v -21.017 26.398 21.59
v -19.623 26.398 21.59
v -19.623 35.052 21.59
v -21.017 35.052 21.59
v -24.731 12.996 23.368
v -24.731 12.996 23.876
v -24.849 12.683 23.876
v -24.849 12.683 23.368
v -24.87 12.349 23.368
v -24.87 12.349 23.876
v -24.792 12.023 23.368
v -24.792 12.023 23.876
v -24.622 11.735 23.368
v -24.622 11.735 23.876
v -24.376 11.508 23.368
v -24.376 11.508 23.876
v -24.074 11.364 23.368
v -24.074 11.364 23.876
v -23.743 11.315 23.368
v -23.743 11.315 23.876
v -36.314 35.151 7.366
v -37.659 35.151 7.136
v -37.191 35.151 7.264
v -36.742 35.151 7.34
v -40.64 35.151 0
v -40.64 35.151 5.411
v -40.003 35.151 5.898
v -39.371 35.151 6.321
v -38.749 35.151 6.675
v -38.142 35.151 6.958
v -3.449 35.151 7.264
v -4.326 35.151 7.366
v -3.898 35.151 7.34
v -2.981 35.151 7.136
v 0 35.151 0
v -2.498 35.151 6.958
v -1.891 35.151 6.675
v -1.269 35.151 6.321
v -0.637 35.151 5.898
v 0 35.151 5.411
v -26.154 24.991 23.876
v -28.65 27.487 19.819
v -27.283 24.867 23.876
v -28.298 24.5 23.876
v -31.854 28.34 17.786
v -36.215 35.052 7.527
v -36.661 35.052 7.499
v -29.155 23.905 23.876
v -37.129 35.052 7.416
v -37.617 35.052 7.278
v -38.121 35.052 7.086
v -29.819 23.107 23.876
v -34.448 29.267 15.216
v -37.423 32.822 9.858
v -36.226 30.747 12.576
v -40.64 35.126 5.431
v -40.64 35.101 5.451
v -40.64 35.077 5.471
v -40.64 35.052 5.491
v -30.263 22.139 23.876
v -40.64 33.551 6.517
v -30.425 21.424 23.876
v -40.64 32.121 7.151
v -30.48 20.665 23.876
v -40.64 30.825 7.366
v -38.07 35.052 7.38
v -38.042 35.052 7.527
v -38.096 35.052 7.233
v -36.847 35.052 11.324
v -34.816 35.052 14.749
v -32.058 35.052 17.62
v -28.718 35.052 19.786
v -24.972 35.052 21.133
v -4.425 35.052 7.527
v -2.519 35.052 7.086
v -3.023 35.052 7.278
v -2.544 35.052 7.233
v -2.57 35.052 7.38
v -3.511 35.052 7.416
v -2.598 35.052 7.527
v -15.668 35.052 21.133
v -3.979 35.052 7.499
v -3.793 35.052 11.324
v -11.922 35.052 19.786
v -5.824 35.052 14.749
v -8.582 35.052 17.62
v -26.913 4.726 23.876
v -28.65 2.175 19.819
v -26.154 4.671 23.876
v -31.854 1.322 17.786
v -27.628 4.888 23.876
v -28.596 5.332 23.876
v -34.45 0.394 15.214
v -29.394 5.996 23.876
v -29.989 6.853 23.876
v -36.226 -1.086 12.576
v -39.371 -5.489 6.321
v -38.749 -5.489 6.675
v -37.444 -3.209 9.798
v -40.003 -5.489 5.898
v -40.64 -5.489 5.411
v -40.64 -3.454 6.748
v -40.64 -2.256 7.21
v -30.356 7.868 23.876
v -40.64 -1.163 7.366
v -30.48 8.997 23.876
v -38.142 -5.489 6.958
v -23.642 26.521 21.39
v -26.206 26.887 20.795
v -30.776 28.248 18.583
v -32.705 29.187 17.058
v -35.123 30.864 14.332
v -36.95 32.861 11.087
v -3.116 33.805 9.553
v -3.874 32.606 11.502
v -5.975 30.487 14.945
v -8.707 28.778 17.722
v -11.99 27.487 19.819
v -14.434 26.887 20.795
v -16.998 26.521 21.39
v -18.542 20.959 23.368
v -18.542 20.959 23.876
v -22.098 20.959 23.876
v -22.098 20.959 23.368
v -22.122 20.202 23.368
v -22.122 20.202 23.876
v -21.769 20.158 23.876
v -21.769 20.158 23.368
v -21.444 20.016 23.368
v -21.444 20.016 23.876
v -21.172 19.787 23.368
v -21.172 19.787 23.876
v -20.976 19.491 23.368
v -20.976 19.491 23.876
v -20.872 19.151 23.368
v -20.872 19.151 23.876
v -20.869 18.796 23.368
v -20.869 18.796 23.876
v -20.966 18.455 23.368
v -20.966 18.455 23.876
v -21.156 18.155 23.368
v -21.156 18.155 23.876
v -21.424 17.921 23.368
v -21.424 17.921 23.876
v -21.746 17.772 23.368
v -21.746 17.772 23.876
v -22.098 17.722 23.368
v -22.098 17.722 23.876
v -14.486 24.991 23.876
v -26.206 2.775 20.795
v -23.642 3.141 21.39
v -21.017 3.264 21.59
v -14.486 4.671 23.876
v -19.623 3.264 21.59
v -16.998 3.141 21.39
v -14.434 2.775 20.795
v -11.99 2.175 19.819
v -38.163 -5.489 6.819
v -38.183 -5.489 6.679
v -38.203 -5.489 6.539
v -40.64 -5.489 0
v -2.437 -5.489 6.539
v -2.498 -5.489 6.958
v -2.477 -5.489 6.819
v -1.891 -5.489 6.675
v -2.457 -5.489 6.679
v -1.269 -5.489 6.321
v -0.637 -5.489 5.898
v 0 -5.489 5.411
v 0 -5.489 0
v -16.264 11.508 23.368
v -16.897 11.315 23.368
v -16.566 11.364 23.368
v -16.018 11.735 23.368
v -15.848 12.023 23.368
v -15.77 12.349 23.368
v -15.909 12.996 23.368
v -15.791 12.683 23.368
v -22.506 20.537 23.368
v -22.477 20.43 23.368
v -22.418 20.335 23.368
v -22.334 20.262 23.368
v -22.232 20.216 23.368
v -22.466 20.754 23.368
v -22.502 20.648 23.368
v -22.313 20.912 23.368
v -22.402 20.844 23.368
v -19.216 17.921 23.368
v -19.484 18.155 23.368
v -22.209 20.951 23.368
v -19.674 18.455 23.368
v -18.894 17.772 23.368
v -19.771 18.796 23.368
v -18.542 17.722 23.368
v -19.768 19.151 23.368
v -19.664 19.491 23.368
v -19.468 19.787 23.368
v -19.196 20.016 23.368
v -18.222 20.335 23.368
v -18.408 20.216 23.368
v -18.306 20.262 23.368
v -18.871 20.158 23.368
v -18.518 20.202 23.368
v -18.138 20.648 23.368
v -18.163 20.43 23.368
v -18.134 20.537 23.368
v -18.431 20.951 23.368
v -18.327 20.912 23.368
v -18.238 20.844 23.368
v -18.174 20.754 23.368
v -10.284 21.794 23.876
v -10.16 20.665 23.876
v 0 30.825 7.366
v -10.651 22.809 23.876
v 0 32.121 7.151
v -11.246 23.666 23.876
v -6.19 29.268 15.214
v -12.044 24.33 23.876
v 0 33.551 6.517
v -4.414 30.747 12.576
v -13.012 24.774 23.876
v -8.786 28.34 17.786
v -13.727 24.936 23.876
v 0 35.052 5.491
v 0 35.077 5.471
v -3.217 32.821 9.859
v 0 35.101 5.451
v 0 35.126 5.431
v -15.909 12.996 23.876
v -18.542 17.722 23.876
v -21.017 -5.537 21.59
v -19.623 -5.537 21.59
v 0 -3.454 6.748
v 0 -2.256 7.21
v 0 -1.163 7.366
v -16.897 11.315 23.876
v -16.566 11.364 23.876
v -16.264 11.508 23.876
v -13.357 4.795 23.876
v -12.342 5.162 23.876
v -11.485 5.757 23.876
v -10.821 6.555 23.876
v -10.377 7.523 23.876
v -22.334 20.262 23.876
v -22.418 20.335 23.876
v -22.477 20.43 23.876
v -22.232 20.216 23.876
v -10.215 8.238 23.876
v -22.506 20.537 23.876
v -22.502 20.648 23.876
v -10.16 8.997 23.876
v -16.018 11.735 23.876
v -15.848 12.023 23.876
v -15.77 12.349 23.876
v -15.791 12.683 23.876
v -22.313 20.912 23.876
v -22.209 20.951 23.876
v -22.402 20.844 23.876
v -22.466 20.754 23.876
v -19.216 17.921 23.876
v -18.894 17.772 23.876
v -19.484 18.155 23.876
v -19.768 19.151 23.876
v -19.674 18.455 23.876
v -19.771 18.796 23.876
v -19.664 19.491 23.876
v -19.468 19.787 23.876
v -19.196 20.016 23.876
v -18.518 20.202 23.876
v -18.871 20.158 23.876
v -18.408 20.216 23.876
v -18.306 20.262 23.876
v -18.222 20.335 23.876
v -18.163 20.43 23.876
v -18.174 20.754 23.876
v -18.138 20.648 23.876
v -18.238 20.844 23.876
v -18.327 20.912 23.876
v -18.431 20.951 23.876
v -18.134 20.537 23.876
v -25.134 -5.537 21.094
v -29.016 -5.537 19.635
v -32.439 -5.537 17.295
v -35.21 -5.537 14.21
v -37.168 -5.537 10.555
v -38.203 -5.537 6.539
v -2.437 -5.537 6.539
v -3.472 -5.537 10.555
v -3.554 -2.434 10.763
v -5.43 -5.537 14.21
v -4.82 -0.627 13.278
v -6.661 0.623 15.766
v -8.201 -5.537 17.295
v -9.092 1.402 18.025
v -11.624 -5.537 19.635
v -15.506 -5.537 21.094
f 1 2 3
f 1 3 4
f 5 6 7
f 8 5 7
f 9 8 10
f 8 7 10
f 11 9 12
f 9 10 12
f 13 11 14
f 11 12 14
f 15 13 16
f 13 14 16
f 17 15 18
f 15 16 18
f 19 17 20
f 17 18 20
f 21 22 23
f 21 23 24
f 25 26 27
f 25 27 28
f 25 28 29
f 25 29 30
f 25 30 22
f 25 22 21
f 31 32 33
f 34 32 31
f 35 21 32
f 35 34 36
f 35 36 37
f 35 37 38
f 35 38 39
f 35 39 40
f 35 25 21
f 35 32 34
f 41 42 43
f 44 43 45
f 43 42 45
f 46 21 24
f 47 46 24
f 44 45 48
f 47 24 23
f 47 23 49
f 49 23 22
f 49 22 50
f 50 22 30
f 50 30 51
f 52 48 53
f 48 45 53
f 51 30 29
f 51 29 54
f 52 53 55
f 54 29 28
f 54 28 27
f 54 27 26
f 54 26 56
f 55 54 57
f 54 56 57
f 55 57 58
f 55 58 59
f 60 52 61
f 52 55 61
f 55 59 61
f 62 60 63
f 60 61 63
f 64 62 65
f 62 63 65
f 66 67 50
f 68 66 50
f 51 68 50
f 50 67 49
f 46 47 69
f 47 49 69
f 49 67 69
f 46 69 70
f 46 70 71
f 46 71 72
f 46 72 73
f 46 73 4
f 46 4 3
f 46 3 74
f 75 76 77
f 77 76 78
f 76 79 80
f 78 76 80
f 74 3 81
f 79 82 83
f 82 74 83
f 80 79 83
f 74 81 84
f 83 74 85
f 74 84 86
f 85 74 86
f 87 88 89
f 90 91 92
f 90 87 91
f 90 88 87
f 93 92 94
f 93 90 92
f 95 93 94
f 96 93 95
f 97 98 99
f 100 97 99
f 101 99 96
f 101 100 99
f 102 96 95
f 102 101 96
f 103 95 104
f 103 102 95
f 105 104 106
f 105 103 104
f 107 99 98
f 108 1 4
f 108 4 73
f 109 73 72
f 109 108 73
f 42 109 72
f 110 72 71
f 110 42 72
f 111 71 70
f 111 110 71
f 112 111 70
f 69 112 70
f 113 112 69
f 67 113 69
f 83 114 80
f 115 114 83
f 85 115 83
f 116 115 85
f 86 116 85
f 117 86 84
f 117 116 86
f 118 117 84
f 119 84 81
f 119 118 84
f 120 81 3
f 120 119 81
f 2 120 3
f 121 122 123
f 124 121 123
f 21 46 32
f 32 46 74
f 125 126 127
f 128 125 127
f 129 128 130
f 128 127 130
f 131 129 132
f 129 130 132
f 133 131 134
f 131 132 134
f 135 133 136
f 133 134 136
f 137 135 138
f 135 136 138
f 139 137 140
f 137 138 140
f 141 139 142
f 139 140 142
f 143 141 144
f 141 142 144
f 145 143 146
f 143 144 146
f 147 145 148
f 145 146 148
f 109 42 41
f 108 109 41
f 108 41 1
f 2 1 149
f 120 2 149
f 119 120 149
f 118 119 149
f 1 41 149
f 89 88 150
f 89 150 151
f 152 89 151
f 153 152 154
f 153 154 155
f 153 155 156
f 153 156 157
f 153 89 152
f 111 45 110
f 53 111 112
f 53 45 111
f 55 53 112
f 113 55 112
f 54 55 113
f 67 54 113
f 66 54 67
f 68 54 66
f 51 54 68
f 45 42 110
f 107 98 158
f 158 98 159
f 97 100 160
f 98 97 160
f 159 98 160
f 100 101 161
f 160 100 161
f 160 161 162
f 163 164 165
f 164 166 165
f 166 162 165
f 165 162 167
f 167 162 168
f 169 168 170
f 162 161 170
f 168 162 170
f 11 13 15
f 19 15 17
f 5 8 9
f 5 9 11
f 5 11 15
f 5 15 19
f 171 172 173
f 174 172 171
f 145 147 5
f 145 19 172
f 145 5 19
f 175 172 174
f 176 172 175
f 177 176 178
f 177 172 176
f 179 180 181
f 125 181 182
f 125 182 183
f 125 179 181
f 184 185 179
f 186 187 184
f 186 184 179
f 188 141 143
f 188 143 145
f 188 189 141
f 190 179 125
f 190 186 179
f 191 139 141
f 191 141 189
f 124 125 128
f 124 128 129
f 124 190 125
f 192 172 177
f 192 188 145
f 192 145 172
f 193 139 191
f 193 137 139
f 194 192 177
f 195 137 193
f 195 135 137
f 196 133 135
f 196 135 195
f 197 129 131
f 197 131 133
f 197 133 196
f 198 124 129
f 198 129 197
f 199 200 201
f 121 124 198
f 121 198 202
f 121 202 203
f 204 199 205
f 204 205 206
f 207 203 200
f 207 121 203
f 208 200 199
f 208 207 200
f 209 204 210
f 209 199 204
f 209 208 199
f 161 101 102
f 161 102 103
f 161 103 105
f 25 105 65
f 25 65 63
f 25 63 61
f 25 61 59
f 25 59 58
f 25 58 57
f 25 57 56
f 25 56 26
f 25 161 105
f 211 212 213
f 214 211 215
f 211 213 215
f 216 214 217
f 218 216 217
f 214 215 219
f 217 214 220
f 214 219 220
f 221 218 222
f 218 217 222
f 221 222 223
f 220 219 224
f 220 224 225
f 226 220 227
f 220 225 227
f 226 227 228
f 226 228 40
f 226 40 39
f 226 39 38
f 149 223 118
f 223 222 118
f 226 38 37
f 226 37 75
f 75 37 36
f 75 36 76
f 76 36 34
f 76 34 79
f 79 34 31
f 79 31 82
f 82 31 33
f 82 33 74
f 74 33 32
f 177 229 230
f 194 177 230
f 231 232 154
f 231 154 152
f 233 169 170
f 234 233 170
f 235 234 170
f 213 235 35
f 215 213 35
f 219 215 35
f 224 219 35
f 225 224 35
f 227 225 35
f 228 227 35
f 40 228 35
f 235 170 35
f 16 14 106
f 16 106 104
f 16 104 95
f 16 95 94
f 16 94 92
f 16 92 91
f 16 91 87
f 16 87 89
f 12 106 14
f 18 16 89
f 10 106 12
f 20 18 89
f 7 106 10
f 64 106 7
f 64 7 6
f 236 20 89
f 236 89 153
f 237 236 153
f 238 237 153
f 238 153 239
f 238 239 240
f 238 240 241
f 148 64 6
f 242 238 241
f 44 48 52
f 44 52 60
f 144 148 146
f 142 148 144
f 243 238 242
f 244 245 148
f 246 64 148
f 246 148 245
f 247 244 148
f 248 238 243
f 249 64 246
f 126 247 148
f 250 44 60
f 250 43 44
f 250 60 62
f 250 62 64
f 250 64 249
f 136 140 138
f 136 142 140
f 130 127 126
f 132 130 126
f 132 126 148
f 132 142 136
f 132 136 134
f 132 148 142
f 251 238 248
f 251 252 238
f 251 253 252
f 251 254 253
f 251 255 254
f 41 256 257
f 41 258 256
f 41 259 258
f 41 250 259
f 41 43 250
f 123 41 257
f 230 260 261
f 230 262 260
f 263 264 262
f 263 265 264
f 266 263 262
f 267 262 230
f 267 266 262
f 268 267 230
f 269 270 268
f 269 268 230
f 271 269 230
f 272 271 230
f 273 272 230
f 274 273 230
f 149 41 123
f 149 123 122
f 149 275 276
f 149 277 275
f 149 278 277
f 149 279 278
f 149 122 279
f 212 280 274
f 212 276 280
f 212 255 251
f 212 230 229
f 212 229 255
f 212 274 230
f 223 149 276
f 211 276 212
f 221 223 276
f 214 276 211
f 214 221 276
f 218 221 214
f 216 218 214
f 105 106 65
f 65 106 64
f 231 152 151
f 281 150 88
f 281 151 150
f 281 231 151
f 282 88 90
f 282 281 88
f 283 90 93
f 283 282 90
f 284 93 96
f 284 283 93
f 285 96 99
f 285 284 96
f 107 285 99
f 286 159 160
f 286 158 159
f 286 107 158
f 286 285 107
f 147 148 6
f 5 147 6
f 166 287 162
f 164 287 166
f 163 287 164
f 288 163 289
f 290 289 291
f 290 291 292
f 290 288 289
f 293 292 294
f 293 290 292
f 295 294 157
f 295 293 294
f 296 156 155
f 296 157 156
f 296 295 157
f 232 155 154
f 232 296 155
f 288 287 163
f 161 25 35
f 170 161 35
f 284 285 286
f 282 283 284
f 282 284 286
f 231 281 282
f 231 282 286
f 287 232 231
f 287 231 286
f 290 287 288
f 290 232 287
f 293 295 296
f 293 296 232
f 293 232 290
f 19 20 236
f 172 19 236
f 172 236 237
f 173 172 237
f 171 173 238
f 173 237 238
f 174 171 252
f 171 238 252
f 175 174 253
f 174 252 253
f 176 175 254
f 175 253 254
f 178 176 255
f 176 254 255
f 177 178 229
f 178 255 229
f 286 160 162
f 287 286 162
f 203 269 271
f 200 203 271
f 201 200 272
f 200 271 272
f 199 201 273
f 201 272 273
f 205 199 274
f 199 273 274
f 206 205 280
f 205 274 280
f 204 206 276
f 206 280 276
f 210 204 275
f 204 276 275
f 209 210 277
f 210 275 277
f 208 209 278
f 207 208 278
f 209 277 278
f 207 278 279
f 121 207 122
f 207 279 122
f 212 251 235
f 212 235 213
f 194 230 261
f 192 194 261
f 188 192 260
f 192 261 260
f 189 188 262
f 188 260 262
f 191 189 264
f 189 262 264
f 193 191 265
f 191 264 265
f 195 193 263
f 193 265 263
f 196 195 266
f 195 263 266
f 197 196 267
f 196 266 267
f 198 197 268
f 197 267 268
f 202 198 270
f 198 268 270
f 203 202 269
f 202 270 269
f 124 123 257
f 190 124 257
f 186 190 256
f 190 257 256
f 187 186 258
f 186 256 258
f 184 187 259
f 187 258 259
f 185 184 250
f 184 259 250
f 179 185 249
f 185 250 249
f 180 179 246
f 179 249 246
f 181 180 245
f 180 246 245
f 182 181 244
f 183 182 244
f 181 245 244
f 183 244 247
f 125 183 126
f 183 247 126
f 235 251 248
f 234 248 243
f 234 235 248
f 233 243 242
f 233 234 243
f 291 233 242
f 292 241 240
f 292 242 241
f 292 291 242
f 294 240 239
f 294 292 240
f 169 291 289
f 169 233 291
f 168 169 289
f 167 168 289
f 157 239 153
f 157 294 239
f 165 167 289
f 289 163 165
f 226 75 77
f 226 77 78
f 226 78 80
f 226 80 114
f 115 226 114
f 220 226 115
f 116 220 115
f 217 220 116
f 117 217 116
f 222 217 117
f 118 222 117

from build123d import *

# Parameters (mm, degrees)
F0_W          = 40.64
F0_H          = 40.64
F1_DEPTH      = 23.876
F2_SIZE2      = 10.16
F2_SIZE       = 16.51
F4_DEPTH      = 5.5372
F4_DEPTH_BACK = 35.052
F6_DEPTH      = 0.508
F7_T4_DEPTH   = 41.0469310155
F7_S5_R       = 17.3367265746
F7_T6_DEPTH   = 25
F7_T10_DEPTH  = 41.0469310155
F7_S11_R      = 17.3367265746
F7_T12_DEPTH  = 25
F7_T16_DEPTH  = 41.0469310155
F7_S17_R      = 17.3367265746
F7_T18_DEPTH  = 25
F7_T23_DEPTH  = 41.0469310155
F7_S24_R      = 17.3367265746
F7_T25_DEPTH  = 25
F7_T30_DEPTH  = 41.0469310155
F7_S31_R      = 17.3367265746
F7_T32_DEPTH  = 25
F7_T37_DEPTH  = 41.0469310155
F7_S39_R      = 17.3367265746
F7_T40_DEPTH  = 25
F7_T44_DEPTH  = 41.0469310155
F7_S46_R      = 17.3367265746
F7_T47_DEPTH  = 25
F7_T51_DEPTH  = 41.0469310155
F7_S53_R      = 17.3367265746
F7_T54_DEPTH  = 25


# Not quite as in the source:
# - a fillet or chamfer that OpenCascade refuses, or shapes differently, is made with other operations: its cross-section is extruded or revolved along the edge and cut away or added


with BuildPart() as f1:
    # F0 (on Top) → F1 (new body)
    with BuildSketch(Plane.XY):
        with Locations((-20.32, 14.8309261845)):
            Rectangle(F0_W, F0_H)
    extrude(amount=F1_DEPTH)

    # F2
    f2_edges = [f1.edges().sort_by_distance(p)[0] for p in [
        (0, 14.830926, 23.876),
        (-20.32, 35.150926, 23.876),
        (-40.64, 14.830926, 23.876),
        (-20.32, -5.489074, 23.876),
    ]]
    chamfer(f2_edges, length=F2_SIZE, length2=F2_SIZE2)

    # F3 (on Front) → F4 (join, two sides)
    with BuildSketch(Plane.XZ) as f4_sk:
        with BuildLine():
            Line((-19.622727835, 21.5899987397), (-21.017272165, 21.5899987397))
            ThreePointArc((-21.017272165, 21.5899987397), (-32.4394065874, 17.2953936781), (-38.2026230943, 6.5392734254))
            Line((-38.2026230943, 6.5392734254), (-2.4373769057, 6.5392734254))
            ThreePointArc((-2.4373769057, 6.5392734254), (-8.2005934126, 17.2953936781), (-19.622727835, 21.5899987397))
        make_face()
    extrude(amount=F4_DEPTH)
    extrude(f4_sk.sketch, amount=-F4_DEPTH_BACK)

    # F5 (on face) → F6 (cut)
    with BuildSketch(Plane.XY.offset(23.876)):
        with BuildLine():
            Line((-20.32, 11.3146617191), (-20.32, 20.958676386))
            Line((-20.32, 20.958676386), (-22.098, 20.958676386))
            ThreePointArc((-22.098, 20.958676386), (-22.5080143202, 20.5929218839), (-22.1218966733, 20.2020238648))
            ThreePointArc((-22.1218966733, 20.2020238648), (-20.8577108363, 18.9738562556), (-22.098, 17.7215606446))
            Line((-22.098, 17.7215606446), (-24.7307707736, 12.9957624854))
            ThreePointArc((-24.7307707736, 12.9957624854), (-24.7178678661, 11.8725673854), (-23.7429447999, 11.3146617191))
            Line((-23.7429447999, 11.3146617191), (-20.32, 11.3146617191))
        make_face()
        with BuildLine():
            Line((-18.542, 20.958676386), (-20.32, 20.958676386))
            Line((-20.32, 20.958676386), (-20.32, 11.3146617191))
            Line((-20.32, 11.3146617191), (-16.8970552001, 11.3146617191))
            ThreePointArc((-16.8970552001, 11.3146617191), (-15.9221321339, 11.8725673854), (-15.9092292264, 12.9957624854))
            Line((-15.9092292264, 12.9957624854), (-18.542, 17.7215606446))
            ThreePointArc((-18.542, 17.7215606446), (-19.7822891637, 18.9738562556), (-18.5181033267, 20.2020238648))
            ThreePointArc((-18.5181033267, 20.2020238648), (-18.1319856798, 20.5929218839), (-18.542, 20.958676386))
        make_face()
    extrude(amount=-F6_DEPTH, mode=Mode.SUBTRACT)

    # F7: fillet of radius 5.08 on 4 edges, made by hand


with BuildPart() as f7_tool2:
    # F7_s3 → F7_t4 (new body)
    with BuildSketch(Plane(origin=(-11.8080697784, -11.8080697784, -19.18811339), x_dir=(-0.7071067812, 0.7071067812, 0), z_dir=(0.4642070825, 0.4642070825, 0.7543365091))):
        with BuildLine():
            ThreePointArc((21.7962143454, 27.1330755892), (24.85545827, 28.157532887), (27.9147021947, 27.1330755892))
            Line((27.9147021947, 27.1330755892), (24.85545827, 29.4407749719))
            Line((24.85545827, 29.4407749719), (21.7962143454, 27.1330755892))
        make_face()
    extrude(amount=F7_T4_DEPTH)

    # F7_s5 → F7_t6 (cut, symmetric)
    with BuildSketch(Plane.XZ.offset(-0.8)):
        with Locations((-21.017272165, 4.253272165)):
            Circle(F7_S5_R)
    extrude(amount=F7_T6_DEPTH, both=True, mode=Mode.SUBTRACT)


with BuildPart() as f1_1:
    add(f1.part)

    # F7_t1: cut F7_tool2
    add(f7_tool2.part, mode=Mode.SUBTRACT)


with BuildPart() as f7_tool8:
    # F7_s9 → F7_t10 (new body)
    with BuildSketch(Plane(origin=(3.050628701, -3.050628701, -4.9572716391), x_dir=(-0.7071067812, -0.7071067812, 0), z_dir=(-0.4642070825, 0.4642070825, 0.7543365091))):
        with BuildLine():
            ThreePointArc((0.8221173927, 5.4558434178), (3.8813613174, 6.4803007156), (6.9406052421, 5.4558434178))
            Line((6.9406052421, 5.4558434178), (3.8813613174, 7.7635428005))
            Line((3.8813613174, 7.7635428005), (0.8221173927, 5.4558434178))
        make_face()
    extrude(amount=F7_T10_DEPTH)

    # F7_s11 → F7_t12 (cut, symmetric)
    with BuildSketch(Plane.XZ.offset(-0.8)):
        with Locations((-19.622727835, 4.253272165)):
            Circle(F7_S11_R)
    extrude(amount=F7_T12_DEPTH, both=True, mode=Mode.SUBTRACT)


with BuildPart() as f1_2:
    add(f1_1.part)

    # F7_t7: cut F7_tool8
    add(f7_tool8.part, mode=Mode.SUBTRACT)


with BuildPart() as f7_tool14:
    # F7_s15 → F7_t16 (new body)
    with BuildSketch(Plane(origin=(9.442408336, 9.442408336, -15.3439135461), x_dir=(0.7071067812, -0.7071067812, 0), z_dir=(-0.4642070825, -0.4642070825, 0.7543365091))):
        with BuildLine():
            ThreePointArc((-21.7962143454, 21.2773704954), (-24.85545827, 22.3018277932), (-27.9147021947, 21.2773704954))
            Line((-27.9147021947, 21.2773704954), (-24.85545827, 23.5850698781))
            Line((-24.85545827, 23.5850698781), (-21.7962143454, 21.2773704954))
        make_face()
    extrude(amount=F7_T16_DEPTH)

    # F7_s17 → F7_t18 (cut, symmetric)
    with BuildSketch(Plane.XZ.offset(-28.8)):
        with Locations((-19.622727835, 4.253272165)):
            Circle(F7_S17_R)
    extrude(amount=F7_T18_DEPTH, both=True, mode=Mode.SUBTRACT)

    split(bisect_by=Plane.XZ.offset(-35.052), keep=Keep.BOTTOM)


with BuildPart() as f1_3:
    add(f1_2.part)

    # F7_t13: cut F7_tool14
    add(f7_tool14.part, mode=Mode.SUBTRACT)


with BuildPart() as f7_tool21:
    # F7_s22 → F7_t23 (new body)
    with BuildSketch(Plane(origin=(9.442408336, 9.442408336, -15.3439135461), x_dir=(0.7071067812, -0.7071067812, 0), z_dir=(-0.4642070825, -0.4642070825, 0.7543365091))):
        with BuildLine():
            ThreePointArc((-21.7962143454, 21.2773704954), (-24.85545827, 22.3018277932), (-27.9147021947, 21.2773704954))
            Line((-27.9147021947, 21.2773704954), (-24.85545827, 23.5850698781))
            Line((-24.85545827, 23.5850698781), (-21.7962143454, 21.2773704954))
        make_face()
    extrude(amount=F7_T23_DEPTH)

    # F7_s24 → F7_t25 (intersect, symmetric)
    with BuildSketch(Plane.XZ.offset(-28.8)):
        with Locations((-19.622727835, 4.253272165)):
            Circle(F7_S24_R)
    extrude(amount=F7_T25_DEPTH, both=True, mode=Mode.INTERSECT)

    split(bisect_by=Plane.XZ.offset(-35.052), keep=Keep.BOTTOM)


with BuildPart() as f1_4:
    add(f1_3.part)

    # F7_t20: cut F7_tool21
    add(f7_tool21.part, mode=Mode.SUBTRACT)


with BuildPart() as f7_tool28:
    # F7_s29 → F7_t30 (new body)
    with BuildSketch(Plane(origin=(9.442408336, 9.442408336, -15.3439135461), x_dir=(0.7071067812, -0.7071067812, 0), z_dir=(-0.4642070825, -0.4642070825, 0.7543365091))):
        with BuildLine():
            ThreePointArc((-21.7962143454, 21.2773704954), (-24.85545827, 22.3018277932), (-27.9147021947, 21.2773704954))
            Line((-27.9147021947, 21.2773704954), (-24.85545827, 23.5850698781))
            Line((-24.85545827, 23.5850698781), (-21.7962143454, 21.2773704954))
        make_face()
    extrude(amount=F7_T30_DEPTH)

    # F7_s31 → F7_t32 (cut, symmetric)
    with BuildSketch(Plane.XZ.offset(-28.8)):
        with Locations((-19.622727835, 4.253272165)):
            Circle(F7_S31_R)
    extrude(amount=F7_T32_DEPTH, both=True, mode=Mode.SUBTRACT)

    split(bisect_by=Plane.XZ.offset(-35.052), keep=Keep.TOP)


with BuildPart() as f1_5:
    add(f1_4.part)

    # F7_t27: cut F7_tool28
    add(f7_tool28.part, mode=Mode.SUBTRACT)


with BuildPart() as f7_tool35:
    # F7_s36 → F7_t37 (new body)
    with BuildSketch(Plane(origin=(-18.1998494135, 18.1998494135, -29.5747552969), x_dir=(0.7071067812, 0.7071067812, 0), z_dir=(0.4642070825, -0.4642070825, 0.7543365091))):
        with BuildLine():
            ThreePointArc((-0.8221173927, 42.9546026668), (-3.8813613174, 43.9790599646), (-6.9406052421, 42.9546026668))
            Line((-6.9406052421, 42.9546026668), (-3.8813613174, 45.2623020495))
            Line((-3.8813613174, 45.2623020495), (-0.8221173927, 42.9546026668))
        make_face()
    extrude(amount=F7_T37_DEPTH)

    split(bisect_by=Plane.XZ.offset(-35.052), keep=Keep.BOTTOM)

    # F7_s39 → F7_t40 (cut, symmetric)
    with BuildSketch(Plane.XZ.offset(-28.8)):
        with Locations((-21.017272165, 4.253272165)):
            Circle(F7_S39_R)
    extrude(amount=F7_T40_DEPTH, both=True, mode=Mode.SUBTRACT)


with BuildPart() as f1_6:
    add(f1_5.part)

    # F7_t34: cut F7_tool35
    add(f7_tool35.part, mode=Mode.SUBTRACT)


with BuildPart() as f7_tool42:
    # F7_s43 → F7_t44 (new body)
    with BuildSketch(Plane(origin=(-18.1998494135, 18.1998494135, -29.5747552969), x_dir=(0.7071067812, 0.7071067812, 0), z_dir=(0.4642070825, -0.4642070825, 0.7543365091))):
        with BuildLine():
            ThreePointArc((-0.8221173927, 42.9546026668), (-3.8813613174, 43.9790599646), (-6.9406052421, 42.9546026668))
            Line((-6.9406052421, 42.9546026668), (-3.8813613174, 45.2623020495))
            Line((-3.8813613174, 45.2623020495), (-0.8221173927, 42.9546026668))
        make_face()
    extrude(amount=F7_T44_DEPTH)

    split(bisect_by=Plane.XZ.offset(-35.052), keep=Keep.TOP)

    # F7_s46 → F7_t47 (cut, symmetric)
    with BuildSketch(Plane.XZ.offset(-28.8)):
        with Locations((-21.017272165, 4.253272165)):
            Circle(F7_S46_R)
    extrude(amount=F7_T47_DEPTH, both=True, mode=Mode.SUBTRACT)


with BuildPart() as f1_7:
    add(f1_6.part)

    # F7_t41: cut F7_tool42
    add(f7_tool42.part, mode=Mode.SUBTRACT)


with BuildPart() as f7_tool49:
    # F7_s50 → F7_t51 (new body)
    with BuildSketch(Plane(origin=(-18.1998494135, 18.1998494135, -29.5747552969), x_dir=(0.7071067812, 0.7071067812, 0), z_dir=(0.4642070825, -0.4642070825, 0.7543365091))):
        with BuildLine():
            ThreePointArc((-0.8221173927, 42.9546026668), (-3.8813613174, 43.9790599646), (-6.9406052421, 42.9546026668))
            Line((-6.9406052421, 42.9546026668), (-3.8813613174, 45.2623020495))
            Line((-3.8813613174, 45.2623020495), (-0.8221173927, 42.9546026668))
        make_face()
    extrude(amount=F7_T51_DEPTH)

    split(bisect_by=Plane.XZ.offset(-35.052), keep=Keep.BOTTOM)

    # F7_s53 → F7_t54 (intersect, symmetric)
    with BuildSketch(Plane.XZ.offset(-28.8)):
        with Locations((-21.017272165, 4.253272165)):
            Circle(F7_S53_R)
    extrude(amount=F7_T54_DEPTH, both=True, mode=Mode.INTERSECT)


with BuildPart() as f1_8:
    add(f1_7.part)

    # F7_t48: cut F7_tool49
    add(f7_tool49.part, mode=Mode.SUBTRACT)


solid = f1_8.part
